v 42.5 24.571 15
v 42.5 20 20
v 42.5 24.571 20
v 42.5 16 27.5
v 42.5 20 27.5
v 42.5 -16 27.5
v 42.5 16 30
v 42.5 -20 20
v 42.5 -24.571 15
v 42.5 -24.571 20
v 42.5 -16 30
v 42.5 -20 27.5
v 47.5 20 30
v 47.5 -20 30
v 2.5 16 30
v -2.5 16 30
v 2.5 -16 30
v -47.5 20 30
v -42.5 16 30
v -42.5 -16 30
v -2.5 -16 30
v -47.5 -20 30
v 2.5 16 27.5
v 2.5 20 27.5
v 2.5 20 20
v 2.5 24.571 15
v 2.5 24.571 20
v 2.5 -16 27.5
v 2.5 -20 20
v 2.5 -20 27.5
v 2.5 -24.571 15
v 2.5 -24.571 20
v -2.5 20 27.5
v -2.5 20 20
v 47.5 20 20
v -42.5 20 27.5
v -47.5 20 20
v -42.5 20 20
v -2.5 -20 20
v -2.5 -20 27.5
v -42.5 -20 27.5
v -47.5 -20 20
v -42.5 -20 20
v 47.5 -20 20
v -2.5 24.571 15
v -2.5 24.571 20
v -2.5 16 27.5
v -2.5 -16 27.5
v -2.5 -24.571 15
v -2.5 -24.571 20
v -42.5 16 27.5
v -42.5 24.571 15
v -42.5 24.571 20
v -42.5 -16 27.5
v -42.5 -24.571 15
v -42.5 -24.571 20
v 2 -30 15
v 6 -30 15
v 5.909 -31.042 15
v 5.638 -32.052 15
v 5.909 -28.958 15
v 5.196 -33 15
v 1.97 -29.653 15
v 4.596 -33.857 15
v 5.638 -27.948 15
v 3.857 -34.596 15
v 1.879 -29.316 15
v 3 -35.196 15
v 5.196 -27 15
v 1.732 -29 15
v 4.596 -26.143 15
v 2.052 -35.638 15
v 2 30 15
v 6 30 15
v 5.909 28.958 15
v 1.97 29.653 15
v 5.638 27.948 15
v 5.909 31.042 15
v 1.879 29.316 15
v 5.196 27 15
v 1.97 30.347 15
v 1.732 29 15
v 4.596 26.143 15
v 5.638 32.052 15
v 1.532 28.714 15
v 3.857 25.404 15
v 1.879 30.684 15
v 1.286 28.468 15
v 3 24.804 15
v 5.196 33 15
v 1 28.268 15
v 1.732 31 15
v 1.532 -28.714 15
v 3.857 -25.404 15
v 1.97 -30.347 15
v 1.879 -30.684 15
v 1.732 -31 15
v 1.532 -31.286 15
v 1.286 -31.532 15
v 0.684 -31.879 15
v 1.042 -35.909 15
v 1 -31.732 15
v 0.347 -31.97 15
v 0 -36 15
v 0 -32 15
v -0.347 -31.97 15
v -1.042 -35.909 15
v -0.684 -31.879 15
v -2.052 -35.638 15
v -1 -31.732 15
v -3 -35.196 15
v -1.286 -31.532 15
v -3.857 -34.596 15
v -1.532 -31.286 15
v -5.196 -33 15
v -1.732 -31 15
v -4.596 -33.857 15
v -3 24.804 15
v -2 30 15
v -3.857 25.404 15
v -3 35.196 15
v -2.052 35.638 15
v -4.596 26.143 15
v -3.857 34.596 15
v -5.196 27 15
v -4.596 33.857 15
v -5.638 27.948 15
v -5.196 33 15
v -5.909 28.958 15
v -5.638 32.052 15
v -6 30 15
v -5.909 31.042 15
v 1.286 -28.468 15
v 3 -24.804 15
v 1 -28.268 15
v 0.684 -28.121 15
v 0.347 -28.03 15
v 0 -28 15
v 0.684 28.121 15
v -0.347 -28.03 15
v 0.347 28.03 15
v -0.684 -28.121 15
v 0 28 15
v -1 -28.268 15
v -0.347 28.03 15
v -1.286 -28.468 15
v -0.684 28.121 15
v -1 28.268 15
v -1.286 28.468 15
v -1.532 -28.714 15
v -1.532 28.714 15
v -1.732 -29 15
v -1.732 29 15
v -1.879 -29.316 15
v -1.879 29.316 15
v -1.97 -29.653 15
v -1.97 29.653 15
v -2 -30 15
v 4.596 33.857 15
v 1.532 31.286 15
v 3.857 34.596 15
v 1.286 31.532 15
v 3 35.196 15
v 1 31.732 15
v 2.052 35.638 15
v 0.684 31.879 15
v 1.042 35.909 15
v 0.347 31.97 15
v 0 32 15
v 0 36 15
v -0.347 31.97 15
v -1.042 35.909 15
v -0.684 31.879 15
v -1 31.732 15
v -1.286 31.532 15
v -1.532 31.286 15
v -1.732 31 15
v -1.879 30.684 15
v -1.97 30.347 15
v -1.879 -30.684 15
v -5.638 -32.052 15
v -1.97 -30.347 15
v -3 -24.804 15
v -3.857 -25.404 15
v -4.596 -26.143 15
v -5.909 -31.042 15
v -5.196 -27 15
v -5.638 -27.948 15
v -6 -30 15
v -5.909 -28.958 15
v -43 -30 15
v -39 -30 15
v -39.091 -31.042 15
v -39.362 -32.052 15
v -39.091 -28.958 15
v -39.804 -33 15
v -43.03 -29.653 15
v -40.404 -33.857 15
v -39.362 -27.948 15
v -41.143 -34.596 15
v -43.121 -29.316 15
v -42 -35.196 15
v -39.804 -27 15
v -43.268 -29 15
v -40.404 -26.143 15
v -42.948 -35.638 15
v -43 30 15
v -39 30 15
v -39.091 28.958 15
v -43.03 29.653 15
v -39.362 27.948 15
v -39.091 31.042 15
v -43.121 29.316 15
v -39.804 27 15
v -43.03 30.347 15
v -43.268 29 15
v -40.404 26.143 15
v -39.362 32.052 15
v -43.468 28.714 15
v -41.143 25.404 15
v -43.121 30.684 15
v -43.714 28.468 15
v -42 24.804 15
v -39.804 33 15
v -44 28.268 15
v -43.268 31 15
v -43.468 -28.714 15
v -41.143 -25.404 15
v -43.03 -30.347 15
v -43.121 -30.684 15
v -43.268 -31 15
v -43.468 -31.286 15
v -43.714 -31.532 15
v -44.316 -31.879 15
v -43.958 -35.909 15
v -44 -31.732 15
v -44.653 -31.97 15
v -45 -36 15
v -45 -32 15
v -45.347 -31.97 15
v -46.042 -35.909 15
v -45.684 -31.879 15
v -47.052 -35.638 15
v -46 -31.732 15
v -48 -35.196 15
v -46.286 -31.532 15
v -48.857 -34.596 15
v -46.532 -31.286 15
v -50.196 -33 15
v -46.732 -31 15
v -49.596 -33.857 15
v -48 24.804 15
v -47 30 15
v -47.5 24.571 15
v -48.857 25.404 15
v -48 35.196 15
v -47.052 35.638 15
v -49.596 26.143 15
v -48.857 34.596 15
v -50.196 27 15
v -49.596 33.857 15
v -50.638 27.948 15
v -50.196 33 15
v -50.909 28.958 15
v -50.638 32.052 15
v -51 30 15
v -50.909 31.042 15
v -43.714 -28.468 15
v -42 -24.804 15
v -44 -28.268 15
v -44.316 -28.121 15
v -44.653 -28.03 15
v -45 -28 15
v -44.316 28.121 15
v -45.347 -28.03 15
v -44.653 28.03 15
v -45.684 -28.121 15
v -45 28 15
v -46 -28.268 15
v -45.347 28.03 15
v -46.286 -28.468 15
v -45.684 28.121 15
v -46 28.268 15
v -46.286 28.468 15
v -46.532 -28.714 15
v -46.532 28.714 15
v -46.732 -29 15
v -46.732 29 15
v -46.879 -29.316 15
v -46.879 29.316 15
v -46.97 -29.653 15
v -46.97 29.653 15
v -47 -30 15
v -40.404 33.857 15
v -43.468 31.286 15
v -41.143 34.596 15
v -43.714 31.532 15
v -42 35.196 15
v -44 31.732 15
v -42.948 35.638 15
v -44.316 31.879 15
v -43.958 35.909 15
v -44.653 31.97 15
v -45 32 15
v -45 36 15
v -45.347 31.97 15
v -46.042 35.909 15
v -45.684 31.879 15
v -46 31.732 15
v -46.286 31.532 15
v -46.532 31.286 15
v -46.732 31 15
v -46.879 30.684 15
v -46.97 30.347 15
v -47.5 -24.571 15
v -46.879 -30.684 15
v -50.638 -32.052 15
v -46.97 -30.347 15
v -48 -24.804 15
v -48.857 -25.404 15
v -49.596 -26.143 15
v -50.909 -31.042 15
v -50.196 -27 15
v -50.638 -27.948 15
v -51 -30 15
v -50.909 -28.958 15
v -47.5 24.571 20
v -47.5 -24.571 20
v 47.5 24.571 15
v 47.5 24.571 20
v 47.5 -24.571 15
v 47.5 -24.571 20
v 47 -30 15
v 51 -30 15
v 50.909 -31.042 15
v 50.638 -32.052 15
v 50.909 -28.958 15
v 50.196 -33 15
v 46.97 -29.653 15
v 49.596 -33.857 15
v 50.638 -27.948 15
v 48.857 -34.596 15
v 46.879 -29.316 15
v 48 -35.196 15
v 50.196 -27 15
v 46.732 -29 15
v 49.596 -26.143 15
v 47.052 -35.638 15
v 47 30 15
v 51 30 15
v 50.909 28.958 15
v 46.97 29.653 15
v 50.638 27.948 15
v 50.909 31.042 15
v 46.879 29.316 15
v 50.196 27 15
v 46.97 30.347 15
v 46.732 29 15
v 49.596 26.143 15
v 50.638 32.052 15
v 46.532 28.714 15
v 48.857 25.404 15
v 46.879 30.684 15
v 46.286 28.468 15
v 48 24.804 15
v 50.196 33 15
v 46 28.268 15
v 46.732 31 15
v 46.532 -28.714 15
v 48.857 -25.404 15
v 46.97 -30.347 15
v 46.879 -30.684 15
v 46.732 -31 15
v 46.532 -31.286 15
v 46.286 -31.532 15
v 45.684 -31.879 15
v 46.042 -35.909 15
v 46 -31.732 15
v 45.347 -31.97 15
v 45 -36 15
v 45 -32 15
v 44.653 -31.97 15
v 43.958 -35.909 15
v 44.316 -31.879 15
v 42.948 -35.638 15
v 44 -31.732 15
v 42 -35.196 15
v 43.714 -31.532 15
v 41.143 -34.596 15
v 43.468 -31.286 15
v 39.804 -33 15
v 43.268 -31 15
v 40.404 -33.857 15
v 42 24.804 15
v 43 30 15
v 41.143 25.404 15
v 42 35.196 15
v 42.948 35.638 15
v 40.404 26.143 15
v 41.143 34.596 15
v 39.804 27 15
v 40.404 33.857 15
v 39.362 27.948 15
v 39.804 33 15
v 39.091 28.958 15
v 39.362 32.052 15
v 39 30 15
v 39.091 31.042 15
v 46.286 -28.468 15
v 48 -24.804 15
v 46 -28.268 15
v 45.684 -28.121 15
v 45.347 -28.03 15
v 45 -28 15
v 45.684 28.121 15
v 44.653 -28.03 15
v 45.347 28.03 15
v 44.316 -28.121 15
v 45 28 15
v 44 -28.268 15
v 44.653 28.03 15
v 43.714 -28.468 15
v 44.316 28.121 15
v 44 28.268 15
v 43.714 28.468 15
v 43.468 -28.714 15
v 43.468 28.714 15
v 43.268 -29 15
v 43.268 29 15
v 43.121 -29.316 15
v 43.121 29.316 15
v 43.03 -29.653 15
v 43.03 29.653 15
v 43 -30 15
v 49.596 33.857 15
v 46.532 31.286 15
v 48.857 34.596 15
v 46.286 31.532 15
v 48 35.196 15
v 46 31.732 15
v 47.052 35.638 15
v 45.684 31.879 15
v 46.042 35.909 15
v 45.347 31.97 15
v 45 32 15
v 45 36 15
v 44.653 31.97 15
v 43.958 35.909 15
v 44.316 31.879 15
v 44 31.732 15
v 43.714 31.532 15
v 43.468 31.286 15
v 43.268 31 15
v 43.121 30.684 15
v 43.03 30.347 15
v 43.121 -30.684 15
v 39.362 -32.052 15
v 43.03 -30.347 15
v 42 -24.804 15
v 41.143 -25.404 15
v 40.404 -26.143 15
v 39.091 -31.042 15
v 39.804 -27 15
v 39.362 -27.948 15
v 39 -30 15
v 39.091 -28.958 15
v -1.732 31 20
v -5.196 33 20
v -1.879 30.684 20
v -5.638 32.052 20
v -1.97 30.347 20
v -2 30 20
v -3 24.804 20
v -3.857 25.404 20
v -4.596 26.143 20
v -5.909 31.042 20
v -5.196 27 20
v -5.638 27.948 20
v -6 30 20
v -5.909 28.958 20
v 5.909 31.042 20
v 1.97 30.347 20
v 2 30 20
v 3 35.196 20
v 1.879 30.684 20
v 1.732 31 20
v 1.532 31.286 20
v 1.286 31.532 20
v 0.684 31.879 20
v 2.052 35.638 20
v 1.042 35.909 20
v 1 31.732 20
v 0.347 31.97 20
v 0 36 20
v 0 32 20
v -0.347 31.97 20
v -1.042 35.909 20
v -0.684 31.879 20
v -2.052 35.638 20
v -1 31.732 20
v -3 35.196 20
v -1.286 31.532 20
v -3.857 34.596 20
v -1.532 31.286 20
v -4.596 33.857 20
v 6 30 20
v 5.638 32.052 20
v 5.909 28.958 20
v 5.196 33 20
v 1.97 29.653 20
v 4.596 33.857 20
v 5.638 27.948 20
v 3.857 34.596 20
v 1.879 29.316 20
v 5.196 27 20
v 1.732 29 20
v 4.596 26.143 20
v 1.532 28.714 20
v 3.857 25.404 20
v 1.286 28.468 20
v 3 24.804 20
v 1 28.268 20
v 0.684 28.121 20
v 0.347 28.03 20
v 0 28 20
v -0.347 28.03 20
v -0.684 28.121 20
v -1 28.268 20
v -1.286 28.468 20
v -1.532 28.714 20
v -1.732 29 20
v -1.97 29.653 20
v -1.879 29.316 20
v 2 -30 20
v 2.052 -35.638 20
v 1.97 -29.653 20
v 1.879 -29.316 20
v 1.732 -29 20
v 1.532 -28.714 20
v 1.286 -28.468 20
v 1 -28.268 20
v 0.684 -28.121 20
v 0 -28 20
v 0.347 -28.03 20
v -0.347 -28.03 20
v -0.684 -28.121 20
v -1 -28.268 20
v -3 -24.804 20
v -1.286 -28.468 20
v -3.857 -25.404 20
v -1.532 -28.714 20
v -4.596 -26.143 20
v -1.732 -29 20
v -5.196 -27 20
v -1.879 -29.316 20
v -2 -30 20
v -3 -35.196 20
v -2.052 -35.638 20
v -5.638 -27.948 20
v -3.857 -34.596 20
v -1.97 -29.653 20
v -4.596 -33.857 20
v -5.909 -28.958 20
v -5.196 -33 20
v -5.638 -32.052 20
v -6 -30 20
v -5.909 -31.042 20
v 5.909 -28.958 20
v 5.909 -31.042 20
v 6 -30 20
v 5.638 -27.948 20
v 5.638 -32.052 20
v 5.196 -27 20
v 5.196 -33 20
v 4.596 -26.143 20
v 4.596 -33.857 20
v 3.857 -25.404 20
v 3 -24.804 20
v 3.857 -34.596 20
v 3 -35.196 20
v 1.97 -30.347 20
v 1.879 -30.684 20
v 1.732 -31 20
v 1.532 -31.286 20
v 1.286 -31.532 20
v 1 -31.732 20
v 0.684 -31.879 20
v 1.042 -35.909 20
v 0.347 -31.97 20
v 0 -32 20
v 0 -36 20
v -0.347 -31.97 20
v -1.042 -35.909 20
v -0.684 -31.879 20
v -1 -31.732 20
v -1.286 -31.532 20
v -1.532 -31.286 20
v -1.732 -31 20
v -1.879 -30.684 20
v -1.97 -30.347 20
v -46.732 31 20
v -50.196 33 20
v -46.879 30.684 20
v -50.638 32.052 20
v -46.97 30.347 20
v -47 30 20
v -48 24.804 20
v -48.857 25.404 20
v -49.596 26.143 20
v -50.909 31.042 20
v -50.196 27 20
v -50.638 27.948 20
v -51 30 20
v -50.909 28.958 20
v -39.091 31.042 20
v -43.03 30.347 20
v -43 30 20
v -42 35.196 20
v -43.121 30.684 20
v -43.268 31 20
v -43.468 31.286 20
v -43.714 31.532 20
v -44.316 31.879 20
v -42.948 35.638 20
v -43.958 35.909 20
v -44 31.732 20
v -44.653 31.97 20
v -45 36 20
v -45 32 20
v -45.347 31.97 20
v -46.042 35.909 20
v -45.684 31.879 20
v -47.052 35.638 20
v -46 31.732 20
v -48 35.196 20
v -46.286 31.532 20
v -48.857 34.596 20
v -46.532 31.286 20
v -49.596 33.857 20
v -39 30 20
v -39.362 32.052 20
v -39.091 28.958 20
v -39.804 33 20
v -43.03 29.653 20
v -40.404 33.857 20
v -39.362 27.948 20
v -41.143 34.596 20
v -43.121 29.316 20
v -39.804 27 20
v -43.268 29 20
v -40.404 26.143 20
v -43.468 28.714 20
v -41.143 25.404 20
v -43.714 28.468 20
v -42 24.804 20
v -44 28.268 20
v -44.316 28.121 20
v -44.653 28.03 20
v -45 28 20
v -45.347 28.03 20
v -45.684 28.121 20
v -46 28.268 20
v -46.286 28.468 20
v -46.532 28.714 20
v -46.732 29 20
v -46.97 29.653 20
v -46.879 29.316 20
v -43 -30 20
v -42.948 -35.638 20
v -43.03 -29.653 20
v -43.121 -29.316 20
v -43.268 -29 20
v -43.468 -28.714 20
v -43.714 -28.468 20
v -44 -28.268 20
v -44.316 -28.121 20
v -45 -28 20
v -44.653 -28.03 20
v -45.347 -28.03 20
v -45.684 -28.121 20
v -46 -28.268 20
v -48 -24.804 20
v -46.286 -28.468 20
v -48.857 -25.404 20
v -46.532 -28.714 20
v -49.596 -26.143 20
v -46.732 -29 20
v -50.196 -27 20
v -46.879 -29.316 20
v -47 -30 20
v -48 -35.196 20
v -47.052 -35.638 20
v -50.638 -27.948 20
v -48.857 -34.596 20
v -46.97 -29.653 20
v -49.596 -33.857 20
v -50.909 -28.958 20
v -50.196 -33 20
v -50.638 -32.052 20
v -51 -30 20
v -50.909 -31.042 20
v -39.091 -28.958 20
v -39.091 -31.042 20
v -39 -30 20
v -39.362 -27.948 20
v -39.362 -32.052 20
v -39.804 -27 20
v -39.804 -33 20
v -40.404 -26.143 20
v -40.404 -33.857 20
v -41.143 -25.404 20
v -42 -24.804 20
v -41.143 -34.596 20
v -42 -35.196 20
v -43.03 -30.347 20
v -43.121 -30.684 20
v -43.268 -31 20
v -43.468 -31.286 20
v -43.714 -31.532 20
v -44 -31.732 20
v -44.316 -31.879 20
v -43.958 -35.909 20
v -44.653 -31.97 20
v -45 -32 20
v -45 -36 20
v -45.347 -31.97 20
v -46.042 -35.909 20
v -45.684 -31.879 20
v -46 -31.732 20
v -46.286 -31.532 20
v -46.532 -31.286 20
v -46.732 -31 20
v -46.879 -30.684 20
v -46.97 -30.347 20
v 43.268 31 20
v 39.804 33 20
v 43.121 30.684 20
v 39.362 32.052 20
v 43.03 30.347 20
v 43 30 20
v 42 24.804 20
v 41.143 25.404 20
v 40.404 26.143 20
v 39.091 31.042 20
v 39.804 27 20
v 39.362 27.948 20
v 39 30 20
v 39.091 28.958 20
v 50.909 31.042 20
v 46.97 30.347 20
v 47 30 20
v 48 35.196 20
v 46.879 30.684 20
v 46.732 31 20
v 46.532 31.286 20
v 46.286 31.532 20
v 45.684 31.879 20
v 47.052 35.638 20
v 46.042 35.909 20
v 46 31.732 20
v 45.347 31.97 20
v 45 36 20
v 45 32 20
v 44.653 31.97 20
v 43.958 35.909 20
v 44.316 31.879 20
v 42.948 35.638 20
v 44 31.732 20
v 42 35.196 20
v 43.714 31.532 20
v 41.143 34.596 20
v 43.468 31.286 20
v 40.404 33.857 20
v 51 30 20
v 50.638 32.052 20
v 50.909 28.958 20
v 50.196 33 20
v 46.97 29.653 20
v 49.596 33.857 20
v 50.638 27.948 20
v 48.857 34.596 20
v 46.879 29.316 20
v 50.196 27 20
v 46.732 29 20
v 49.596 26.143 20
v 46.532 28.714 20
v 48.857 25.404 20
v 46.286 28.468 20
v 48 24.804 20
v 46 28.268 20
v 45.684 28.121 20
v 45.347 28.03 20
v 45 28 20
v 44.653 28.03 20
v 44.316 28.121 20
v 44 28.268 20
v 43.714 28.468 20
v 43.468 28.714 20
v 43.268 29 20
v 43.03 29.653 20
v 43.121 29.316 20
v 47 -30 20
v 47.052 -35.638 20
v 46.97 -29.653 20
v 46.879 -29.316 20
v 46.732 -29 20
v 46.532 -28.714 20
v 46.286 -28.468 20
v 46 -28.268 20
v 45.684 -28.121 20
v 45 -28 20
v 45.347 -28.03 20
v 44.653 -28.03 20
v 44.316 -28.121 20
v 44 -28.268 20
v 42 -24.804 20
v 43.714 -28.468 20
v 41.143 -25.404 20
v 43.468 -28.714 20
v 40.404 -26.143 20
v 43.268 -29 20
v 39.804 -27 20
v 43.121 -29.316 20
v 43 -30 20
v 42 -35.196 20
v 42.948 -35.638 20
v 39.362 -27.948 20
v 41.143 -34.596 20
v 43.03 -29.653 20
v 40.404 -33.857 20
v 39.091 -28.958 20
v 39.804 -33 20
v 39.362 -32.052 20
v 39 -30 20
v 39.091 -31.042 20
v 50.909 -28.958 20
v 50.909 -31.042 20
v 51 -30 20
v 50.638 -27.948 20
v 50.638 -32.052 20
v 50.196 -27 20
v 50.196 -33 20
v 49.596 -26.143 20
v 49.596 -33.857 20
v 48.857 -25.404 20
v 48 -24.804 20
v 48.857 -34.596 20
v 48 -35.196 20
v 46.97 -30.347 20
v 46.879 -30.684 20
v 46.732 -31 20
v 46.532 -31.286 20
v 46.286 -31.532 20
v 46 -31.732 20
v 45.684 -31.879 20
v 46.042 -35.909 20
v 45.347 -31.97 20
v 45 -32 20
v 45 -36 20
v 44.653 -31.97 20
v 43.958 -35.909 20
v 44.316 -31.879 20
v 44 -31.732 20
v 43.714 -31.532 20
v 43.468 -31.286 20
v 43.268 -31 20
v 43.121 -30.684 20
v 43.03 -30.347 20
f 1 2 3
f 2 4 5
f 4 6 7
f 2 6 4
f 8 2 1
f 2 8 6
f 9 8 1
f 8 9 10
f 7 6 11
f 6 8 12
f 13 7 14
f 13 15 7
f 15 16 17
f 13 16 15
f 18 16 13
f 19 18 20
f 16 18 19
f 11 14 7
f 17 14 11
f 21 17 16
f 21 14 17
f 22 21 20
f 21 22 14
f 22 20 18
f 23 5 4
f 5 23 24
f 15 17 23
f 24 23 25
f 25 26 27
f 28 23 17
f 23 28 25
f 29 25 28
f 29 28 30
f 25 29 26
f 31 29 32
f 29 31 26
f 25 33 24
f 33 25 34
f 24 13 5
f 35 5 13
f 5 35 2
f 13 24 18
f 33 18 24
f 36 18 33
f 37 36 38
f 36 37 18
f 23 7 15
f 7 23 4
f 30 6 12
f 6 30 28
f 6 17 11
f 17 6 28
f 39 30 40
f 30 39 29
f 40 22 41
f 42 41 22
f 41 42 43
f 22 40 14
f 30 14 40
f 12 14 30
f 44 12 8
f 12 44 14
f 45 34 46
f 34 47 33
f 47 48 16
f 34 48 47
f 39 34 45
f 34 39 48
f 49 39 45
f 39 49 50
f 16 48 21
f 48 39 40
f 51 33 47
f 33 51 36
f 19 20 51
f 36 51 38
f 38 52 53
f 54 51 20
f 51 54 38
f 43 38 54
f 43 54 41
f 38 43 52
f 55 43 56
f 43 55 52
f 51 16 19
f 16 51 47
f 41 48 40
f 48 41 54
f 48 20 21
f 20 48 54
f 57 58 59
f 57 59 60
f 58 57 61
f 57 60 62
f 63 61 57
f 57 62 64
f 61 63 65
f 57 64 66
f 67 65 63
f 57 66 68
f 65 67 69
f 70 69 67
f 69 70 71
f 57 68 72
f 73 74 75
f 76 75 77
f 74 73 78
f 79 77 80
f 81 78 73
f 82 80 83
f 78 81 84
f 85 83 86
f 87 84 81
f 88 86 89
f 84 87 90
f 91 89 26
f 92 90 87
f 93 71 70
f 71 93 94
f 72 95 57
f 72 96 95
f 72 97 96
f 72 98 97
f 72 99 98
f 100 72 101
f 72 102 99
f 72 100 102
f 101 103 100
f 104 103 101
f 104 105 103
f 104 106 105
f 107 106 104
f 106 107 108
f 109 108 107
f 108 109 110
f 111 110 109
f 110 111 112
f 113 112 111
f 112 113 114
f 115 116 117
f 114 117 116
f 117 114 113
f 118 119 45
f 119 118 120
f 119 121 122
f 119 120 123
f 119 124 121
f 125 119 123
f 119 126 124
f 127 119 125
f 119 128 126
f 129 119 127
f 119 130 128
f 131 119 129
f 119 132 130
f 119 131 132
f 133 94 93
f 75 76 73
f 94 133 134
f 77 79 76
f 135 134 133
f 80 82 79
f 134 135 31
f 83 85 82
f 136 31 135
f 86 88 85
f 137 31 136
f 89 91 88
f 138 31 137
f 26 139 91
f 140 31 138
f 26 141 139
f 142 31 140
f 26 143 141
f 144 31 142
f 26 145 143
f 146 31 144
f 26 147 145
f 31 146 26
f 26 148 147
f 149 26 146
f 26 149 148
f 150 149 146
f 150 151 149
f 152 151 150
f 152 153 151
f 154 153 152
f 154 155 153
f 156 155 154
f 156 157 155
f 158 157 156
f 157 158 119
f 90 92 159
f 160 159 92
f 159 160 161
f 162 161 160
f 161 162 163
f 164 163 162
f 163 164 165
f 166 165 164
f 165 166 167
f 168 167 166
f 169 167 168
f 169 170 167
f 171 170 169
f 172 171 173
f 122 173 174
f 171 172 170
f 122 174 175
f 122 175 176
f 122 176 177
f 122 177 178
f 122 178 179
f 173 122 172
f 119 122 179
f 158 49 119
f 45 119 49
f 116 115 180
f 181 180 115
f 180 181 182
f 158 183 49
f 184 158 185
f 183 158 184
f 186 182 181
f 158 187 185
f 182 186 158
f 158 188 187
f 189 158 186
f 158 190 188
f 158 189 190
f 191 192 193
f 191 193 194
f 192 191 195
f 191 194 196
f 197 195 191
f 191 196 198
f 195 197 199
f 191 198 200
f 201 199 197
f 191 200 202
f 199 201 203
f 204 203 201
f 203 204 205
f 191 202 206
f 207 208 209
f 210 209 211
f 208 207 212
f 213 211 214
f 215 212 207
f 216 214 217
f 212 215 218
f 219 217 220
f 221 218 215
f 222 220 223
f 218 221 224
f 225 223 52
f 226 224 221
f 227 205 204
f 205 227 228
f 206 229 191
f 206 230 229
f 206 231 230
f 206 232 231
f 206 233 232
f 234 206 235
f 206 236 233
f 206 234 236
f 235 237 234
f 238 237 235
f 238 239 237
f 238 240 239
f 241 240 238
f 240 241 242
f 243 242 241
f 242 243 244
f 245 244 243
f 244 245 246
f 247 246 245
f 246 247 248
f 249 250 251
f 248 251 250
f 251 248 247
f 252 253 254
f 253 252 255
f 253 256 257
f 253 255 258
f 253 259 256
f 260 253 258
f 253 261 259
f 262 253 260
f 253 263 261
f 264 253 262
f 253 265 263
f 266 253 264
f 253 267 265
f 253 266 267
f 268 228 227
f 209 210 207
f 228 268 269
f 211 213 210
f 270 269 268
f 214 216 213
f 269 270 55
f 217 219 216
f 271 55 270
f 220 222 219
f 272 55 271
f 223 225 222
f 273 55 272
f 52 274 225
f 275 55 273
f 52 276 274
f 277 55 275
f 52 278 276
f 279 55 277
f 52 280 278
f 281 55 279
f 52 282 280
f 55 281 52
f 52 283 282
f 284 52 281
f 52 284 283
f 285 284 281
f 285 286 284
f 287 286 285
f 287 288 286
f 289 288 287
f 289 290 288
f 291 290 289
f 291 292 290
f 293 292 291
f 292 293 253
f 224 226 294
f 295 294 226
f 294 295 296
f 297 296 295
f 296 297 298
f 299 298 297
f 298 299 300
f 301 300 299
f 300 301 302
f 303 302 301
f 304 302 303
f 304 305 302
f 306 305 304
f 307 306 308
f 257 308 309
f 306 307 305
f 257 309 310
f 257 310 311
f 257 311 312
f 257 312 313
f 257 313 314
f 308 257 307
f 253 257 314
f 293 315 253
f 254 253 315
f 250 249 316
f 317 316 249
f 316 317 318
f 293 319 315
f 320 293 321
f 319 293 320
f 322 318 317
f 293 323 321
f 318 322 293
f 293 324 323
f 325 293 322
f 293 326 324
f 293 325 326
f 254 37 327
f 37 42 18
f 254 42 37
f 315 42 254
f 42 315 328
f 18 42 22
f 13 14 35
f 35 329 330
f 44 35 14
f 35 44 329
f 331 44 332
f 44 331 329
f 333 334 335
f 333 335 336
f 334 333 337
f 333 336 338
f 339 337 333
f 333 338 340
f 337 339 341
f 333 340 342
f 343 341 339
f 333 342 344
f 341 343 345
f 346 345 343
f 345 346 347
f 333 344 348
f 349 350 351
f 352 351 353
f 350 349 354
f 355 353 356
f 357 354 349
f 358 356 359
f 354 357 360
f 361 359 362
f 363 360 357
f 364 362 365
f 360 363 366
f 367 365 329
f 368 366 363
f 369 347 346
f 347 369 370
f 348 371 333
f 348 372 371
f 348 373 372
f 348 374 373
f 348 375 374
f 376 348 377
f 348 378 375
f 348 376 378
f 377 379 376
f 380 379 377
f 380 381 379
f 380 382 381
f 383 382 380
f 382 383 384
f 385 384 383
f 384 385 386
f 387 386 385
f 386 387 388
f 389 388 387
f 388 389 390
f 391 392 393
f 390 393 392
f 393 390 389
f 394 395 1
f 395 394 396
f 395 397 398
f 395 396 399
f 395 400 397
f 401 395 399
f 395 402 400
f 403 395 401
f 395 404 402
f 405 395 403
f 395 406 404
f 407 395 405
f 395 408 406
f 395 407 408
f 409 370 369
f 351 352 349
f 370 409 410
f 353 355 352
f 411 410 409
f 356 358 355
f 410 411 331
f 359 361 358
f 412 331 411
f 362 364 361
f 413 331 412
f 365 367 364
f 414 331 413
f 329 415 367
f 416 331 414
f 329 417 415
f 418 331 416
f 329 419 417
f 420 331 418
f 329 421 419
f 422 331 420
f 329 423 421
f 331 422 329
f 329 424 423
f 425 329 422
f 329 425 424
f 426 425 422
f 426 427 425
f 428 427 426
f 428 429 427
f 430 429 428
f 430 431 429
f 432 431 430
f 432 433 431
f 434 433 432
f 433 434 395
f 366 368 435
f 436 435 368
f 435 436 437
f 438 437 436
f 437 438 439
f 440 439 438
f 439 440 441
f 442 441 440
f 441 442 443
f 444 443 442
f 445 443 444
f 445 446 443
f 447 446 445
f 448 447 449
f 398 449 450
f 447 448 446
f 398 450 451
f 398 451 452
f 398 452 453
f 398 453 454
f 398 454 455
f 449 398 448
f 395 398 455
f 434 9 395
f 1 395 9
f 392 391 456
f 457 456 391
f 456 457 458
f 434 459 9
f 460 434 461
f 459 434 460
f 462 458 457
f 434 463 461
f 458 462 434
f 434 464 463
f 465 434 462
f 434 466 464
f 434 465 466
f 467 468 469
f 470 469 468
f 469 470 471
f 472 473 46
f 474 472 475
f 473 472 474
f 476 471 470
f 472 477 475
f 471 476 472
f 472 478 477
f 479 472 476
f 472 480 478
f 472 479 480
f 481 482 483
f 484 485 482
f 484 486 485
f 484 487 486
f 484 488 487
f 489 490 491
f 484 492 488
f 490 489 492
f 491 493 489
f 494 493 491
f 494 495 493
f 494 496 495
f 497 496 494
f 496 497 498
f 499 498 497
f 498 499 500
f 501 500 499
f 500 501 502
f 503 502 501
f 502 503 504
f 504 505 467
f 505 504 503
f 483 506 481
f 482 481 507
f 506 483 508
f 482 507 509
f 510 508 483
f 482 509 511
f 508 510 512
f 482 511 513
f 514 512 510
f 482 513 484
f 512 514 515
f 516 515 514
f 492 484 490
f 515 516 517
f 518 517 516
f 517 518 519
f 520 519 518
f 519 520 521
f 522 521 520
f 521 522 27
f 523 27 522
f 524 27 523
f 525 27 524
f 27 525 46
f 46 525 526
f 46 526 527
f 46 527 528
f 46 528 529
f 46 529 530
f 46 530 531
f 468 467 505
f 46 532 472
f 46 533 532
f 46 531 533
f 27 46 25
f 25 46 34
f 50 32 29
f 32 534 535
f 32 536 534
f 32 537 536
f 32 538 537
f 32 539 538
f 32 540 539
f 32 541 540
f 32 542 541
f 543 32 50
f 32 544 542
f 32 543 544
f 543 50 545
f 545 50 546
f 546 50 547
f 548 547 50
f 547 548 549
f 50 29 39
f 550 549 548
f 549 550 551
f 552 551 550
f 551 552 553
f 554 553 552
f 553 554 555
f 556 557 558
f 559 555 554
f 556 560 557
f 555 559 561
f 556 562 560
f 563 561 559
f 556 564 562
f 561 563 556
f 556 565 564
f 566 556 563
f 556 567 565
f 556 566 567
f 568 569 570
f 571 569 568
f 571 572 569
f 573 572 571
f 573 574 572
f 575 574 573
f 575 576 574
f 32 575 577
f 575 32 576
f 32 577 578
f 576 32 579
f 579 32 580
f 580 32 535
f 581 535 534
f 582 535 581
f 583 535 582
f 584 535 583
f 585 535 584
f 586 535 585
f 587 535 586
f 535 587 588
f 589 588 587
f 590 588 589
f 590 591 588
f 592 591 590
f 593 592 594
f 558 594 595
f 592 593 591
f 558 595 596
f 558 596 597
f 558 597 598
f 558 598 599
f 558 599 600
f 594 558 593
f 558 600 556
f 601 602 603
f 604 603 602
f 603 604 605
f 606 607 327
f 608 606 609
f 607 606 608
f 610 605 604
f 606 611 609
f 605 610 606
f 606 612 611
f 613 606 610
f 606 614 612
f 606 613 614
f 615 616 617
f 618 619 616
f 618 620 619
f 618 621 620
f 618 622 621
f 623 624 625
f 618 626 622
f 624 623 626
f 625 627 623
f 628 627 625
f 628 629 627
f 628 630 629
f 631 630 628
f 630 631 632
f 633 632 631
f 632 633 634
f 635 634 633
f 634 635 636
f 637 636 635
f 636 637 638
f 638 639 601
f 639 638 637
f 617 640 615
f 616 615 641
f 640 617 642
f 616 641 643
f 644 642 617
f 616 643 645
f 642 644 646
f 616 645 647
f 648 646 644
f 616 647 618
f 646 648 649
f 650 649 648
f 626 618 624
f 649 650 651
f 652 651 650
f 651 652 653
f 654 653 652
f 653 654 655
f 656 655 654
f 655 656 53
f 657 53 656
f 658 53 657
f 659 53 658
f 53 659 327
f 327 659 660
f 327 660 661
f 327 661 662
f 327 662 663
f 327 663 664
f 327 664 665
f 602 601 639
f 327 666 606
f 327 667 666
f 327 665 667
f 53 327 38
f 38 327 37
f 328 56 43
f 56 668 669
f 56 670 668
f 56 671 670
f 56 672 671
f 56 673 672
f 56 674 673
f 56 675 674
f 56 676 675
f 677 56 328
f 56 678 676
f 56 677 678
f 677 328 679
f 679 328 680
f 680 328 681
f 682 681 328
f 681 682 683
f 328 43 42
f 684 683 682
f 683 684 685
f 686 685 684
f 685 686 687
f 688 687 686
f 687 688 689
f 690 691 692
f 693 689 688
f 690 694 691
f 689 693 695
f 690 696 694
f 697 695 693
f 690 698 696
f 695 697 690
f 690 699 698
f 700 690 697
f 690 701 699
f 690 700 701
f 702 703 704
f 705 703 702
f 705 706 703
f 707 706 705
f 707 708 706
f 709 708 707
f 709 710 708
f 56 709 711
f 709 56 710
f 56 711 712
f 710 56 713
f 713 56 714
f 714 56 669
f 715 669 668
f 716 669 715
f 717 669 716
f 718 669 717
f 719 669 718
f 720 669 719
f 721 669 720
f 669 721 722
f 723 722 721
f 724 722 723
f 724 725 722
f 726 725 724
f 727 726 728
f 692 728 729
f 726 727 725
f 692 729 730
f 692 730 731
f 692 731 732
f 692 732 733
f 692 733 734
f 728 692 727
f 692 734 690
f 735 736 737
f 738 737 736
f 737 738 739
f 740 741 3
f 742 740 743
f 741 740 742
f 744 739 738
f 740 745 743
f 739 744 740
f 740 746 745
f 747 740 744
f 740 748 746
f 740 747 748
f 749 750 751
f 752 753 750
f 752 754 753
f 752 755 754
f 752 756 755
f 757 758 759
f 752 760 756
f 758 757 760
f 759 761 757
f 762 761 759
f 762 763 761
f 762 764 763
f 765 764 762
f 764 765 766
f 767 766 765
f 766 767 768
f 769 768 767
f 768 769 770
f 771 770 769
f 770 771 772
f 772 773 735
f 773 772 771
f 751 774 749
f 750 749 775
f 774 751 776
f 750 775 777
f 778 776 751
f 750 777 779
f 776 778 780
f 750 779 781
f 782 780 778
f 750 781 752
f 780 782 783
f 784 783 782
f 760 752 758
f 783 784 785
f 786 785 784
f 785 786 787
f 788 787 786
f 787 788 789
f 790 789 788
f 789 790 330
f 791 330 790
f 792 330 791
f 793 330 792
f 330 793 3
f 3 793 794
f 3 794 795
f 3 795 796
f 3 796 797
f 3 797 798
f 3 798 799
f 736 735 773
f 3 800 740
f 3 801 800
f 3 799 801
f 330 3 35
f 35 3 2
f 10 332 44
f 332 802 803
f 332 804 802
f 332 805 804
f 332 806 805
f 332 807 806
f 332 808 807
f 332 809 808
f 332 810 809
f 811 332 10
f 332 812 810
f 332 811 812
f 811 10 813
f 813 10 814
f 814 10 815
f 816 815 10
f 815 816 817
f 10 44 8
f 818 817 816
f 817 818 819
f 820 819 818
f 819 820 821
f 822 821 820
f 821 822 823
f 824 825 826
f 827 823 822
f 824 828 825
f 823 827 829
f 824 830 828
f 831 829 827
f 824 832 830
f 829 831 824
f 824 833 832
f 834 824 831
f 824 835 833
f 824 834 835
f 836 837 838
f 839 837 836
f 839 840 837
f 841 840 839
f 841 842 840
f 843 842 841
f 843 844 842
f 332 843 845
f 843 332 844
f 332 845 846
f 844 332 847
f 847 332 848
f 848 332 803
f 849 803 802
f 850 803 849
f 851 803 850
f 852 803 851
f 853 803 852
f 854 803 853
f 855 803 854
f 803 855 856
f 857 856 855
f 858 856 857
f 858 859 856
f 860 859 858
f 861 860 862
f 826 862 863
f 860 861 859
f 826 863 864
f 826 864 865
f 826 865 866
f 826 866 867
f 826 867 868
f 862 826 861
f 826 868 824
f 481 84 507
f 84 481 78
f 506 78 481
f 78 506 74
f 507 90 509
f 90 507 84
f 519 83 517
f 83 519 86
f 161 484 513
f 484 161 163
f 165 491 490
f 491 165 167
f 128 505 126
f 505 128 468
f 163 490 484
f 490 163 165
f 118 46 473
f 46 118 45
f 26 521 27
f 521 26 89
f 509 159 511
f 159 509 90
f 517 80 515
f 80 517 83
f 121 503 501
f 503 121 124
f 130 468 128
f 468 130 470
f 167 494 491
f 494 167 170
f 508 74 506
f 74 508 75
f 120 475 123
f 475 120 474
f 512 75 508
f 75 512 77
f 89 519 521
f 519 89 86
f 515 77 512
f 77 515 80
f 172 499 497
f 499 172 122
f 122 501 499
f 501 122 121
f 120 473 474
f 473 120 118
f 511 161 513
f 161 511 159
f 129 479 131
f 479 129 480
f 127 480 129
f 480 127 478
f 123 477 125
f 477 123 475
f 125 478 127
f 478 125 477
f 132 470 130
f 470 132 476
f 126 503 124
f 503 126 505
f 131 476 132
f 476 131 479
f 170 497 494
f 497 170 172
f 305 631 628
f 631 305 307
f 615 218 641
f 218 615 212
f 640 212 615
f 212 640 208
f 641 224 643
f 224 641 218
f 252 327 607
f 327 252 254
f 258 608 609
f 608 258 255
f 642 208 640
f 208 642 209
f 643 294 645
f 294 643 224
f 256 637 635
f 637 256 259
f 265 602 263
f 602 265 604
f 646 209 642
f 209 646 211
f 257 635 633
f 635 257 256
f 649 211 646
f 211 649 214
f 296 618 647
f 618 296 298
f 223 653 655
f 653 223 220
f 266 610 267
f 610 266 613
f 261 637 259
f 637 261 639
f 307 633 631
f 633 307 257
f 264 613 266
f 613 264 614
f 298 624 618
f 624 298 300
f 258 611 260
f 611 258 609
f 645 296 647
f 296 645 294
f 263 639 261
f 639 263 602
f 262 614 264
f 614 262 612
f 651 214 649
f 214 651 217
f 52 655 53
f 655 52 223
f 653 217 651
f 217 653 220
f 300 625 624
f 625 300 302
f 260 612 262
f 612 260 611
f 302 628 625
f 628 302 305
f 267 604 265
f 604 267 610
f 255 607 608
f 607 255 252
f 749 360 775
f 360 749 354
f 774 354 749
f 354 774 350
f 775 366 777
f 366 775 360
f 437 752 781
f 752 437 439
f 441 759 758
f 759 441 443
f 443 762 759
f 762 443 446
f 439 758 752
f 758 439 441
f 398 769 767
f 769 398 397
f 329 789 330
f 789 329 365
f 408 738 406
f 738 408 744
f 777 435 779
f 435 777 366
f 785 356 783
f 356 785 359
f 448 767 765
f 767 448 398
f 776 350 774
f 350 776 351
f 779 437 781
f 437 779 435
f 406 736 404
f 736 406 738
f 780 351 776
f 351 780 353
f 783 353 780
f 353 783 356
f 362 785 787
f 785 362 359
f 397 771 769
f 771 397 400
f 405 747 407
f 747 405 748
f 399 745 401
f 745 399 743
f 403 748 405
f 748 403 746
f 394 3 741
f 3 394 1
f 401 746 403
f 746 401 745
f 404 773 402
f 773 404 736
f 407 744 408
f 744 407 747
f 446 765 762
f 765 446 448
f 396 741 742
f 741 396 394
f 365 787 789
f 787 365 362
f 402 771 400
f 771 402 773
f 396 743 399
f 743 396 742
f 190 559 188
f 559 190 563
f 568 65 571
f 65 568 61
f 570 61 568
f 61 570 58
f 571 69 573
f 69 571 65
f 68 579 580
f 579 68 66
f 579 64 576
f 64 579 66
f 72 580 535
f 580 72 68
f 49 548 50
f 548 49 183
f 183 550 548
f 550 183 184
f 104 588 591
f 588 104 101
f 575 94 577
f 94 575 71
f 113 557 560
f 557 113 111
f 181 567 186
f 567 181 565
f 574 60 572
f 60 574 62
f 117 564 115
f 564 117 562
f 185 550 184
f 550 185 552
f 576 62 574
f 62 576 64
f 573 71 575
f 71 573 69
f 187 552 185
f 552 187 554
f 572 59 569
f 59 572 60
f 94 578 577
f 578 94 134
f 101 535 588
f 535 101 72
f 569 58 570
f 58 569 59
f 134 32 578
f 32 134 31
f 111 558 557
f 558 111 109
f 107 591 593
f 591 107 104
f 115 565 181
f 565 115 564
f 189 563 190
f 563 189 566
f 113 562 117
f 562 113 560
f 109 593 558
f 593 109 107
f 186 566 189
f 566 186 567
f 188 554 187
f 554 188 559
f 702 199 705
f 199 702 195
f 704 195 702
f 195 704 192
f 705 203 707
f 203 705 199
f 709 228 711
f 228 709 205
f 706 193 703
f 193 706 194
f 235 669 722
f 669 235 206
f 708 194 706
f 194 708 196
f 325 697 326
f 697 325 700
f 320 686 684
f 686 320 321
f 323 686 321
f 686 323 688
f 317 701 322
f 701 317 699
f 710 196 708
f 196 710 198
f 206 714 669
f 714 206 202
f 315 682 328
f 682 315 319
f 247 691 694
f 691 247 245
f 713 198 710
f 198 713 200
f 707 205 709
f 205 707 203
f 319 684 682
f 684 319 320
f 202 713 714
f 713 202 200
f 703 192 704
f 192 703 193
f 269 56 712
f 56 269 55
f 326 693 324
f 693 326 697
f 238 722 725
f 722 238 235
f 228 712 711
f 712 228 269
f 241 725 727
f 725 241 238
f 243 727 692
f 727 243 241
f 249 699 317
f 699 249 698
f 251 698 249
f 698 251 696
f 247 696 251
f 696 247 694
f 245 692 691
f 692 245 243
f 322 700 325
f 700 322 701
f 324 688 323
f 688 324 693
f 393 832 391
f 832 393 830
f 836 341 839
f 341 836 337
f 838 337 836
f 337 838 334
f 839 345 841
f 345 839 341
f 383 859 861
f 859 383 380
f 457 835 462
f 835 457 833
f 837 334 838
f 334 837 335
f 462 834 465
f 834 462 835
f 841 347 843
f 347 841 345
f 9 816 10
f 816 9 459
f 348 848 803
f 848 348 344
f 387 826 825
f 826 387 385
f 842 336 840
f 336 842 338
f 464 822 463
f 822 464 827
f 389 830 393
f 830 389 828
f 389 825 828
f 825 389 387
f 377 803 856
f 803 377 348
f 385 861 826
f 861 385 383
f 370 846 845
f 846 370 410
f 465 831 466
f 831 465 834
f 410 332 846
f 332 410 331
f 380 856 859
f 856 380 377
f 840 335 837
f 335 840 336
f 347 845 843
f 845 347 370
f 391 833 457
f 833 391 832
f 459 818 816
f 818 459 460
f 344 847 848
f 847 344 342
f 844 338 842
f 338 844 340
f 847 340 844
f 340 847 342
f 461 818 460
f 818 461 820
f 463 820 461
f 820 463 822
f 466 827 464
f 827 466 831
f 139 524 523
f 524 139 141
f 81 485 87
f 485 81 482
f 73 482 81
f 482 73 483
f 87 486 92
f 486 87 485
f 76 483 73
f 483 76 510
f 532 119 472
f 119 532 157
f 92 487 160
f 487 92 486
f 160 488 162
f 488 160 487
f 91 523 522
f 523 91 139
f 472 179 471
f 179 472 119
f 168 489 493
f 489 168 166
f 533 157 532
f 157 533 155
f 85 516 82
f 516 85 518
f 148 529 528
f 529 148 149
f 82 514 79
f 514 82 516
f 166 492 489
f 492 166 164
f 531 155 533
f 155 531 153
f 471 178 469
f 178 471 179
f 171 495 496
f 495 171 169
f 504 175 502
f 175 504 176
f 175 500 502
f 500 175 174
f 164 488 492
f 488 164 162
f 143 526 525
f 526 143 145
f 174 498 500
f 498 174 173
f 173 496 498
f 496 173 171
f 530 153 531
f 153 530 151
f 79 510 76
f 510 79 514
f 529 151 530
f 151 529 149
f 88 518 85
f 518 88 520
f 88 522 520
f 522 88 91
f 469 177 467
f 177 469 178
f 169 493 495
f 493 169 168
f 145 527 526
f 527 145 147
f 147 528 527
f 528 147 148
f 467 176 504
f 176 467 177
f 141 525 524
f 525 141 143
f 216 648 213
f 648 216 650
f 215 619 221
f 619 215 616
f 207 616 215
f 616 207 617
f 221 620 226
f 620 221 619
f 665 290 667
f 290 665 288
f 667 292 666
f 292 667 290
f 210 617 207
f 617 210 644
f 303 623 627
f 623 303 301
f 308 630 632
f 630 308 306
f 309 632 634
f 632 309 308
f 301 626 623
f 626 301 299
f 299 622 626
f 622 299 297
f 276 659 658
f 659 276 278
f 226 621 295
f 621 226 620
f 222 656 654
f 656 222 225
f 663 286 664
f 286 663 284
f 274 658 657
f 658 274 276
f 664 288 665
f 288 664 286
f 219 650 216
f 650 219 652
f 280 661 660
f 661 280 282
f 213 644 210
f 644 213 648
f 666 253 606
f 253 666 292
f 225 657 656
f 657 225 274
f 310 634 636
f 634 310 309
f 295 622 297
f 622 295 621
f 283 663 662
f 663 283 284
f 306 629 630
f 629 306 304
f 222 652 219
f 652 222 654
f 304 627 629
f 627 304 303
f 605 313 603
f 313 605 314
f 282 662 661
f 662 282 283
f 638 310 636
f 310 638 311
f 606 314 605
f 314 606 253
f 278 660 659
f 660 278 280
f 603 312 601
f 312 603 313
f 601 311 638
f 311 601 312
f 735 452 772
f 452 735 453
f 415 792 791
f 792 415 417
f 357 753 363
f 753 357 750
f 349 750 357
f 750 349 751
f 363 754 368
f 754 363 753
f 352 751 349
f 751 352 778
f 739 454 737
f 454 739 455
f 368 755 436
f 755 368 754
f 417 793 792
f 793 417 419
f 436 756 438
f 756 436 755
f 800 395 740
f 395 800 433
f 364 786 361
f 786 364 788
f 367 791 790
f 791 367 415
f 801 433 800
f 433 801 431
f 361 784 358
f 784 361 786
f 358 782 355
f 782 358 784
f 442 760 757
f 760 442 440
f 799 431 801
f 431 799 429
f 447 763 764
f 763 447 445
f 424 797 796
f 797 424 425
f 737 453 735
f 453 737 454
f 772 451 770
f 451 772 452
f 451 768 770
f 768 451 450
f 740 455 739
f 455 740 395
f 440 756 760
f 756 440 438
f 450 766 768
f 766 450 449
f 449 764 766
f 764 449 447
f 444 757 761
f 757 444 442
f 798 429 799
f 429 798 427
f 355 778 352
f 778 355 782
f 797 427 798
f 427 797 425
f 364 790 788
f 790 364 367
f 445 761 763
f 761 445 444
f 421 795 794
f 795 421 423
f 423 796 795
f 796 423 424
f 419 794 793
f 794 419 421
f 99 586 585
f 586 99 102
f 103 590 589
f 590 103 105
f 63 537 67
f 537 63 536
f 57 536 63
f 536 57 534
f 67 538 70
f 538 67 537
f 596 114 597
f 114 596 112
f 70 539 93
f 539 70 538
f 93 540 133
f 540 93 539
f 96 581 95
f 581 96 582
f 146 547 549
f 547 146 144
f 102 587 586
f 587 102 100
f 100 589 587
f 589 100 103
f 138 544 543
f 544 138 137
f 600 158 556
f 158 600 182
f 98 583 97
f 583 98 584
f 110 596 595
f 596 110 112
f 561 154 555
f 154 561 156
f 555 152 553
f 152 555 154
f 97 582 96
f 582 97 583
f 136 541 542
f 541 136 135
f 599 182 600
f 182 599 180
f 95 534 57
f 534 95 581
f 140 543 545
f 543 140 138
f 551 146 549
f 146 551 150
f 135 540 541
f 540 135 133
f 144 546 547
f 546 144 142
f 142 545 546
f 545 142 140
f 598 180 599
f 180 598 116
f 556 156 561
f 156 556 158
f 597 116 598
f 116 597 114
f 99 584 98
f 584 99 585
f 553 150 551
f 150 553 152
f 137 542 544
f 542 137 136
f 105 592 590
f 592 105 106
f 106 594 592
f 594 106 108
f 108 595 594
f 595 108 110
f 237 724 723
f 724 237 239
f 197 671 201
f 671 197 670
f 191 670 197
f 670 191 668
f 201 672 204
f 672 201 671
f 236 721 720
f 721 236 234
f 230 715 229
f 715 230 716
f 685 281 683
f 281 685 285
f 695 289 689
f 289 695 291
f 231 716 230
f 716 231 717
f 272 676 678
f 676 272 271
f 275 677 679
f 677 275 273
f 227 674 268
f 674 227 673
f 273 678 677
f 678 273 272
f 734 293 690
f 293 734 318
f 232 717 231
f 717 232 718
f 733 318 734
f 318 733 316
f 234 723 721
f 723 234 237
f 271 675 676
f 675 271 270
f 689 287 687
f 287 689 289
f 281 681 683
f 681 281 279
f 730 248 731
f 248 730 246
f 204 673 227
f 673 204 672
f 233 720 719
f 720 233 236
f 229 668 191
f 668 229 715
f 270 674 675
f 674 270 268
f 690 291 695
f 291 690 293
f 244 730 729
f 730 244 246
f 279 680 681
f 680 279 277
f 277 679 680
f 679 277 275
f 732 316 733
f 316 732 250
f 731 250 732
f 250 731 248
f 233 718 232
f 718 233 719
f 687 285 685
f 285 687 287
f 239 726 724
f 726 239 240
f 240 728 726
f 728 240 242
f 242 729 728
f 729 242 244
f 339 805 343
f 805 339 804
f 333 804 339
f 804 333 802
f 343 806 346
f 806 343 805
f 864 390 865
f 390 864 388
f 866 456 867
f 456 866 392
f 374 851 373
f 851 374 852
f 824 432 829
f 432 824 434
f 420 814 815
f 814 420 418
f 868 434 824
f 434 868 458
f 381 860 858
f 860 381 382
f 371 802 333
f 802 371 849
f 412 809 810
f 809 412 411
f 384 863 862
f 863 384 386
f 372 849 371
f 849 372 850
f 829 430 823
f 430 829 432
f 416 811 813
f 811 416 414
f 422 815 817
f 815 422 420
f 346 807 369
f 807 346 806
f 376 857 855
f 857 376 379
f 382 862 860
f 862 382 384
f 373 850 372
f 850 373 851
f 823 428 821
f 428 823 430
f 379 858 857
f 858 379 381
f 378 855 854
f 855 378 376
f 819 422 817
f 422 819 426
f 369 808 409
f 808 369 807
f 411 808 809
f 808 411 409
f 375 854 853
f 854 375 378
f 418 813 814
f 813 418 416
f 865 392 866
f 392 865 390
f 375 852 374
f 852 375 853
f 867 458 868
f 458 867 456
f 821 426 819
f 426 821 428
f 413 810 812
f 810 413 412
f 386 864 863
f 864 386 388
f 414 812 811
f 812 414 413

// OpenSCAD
$fn=36;
module top(){
    translate([22.5,18,28.75])
        cube([40,4,2.5],center=true);
    translate([22.5,-18,28.75])
        cube([40,4,2.5],center=true);
    translate([-22.5,18,28.75])
        cube([40,4,2.5],center=true);
    translate([-22.5,-18,28.75])
        cube([40,4,2.5],center=true);
    translate([0,0,22.5])
        cube([5,40,15],center=true);
    translate([-45,0,22.5])
        cube([5,40,15],center=true);
    translate([45,0,22.5])
        cube([5,40,15],center=true);
    translate([0,0,17.5])
        cube([5,70,5],center=true);
    translate([-45,0,17.5])
        cube([5,70,5],center=true);
    translate([45,0,17.5])
        cube([5,70,5],center=true);
    translate([0,30,17.5])
        cylinder(r=6,h=5,center=true);
    translate([-45,30,17.5])
        cylinder(r=6,h=5,center=true);
    translate([45,30,17.5])
        cylinder(r=6,h=5,center=true);
    translate([0,-30,17.5])
        cylinder(r=6,h=5,center=true);
    translate([-45,-30,17.5])
        cylinder(r=6,h=5,center=true);
    translate([45,-30,17.5])
        cylinder(r=6,h=5,center=true);
}
difference(){
    top();
    translate([0,30,17.5])
        cylinder(r=2,h=6,center=true);
    translate([-45,30,17.5])
        cylinder(r=2,h=6,center=true);
    translate([45,30,17.5])
        cylinder(r=2,h=6,center=true);
    translate([0,-30,17.5])
        cylinder(r=2,h=6,center=true);
    translate([-45,-30,17.5])
        cylinder(r=2,h=6,center=true);
    translate([45,-30,17.5])
        cylinder(r=2,h=6,center=true);
};
